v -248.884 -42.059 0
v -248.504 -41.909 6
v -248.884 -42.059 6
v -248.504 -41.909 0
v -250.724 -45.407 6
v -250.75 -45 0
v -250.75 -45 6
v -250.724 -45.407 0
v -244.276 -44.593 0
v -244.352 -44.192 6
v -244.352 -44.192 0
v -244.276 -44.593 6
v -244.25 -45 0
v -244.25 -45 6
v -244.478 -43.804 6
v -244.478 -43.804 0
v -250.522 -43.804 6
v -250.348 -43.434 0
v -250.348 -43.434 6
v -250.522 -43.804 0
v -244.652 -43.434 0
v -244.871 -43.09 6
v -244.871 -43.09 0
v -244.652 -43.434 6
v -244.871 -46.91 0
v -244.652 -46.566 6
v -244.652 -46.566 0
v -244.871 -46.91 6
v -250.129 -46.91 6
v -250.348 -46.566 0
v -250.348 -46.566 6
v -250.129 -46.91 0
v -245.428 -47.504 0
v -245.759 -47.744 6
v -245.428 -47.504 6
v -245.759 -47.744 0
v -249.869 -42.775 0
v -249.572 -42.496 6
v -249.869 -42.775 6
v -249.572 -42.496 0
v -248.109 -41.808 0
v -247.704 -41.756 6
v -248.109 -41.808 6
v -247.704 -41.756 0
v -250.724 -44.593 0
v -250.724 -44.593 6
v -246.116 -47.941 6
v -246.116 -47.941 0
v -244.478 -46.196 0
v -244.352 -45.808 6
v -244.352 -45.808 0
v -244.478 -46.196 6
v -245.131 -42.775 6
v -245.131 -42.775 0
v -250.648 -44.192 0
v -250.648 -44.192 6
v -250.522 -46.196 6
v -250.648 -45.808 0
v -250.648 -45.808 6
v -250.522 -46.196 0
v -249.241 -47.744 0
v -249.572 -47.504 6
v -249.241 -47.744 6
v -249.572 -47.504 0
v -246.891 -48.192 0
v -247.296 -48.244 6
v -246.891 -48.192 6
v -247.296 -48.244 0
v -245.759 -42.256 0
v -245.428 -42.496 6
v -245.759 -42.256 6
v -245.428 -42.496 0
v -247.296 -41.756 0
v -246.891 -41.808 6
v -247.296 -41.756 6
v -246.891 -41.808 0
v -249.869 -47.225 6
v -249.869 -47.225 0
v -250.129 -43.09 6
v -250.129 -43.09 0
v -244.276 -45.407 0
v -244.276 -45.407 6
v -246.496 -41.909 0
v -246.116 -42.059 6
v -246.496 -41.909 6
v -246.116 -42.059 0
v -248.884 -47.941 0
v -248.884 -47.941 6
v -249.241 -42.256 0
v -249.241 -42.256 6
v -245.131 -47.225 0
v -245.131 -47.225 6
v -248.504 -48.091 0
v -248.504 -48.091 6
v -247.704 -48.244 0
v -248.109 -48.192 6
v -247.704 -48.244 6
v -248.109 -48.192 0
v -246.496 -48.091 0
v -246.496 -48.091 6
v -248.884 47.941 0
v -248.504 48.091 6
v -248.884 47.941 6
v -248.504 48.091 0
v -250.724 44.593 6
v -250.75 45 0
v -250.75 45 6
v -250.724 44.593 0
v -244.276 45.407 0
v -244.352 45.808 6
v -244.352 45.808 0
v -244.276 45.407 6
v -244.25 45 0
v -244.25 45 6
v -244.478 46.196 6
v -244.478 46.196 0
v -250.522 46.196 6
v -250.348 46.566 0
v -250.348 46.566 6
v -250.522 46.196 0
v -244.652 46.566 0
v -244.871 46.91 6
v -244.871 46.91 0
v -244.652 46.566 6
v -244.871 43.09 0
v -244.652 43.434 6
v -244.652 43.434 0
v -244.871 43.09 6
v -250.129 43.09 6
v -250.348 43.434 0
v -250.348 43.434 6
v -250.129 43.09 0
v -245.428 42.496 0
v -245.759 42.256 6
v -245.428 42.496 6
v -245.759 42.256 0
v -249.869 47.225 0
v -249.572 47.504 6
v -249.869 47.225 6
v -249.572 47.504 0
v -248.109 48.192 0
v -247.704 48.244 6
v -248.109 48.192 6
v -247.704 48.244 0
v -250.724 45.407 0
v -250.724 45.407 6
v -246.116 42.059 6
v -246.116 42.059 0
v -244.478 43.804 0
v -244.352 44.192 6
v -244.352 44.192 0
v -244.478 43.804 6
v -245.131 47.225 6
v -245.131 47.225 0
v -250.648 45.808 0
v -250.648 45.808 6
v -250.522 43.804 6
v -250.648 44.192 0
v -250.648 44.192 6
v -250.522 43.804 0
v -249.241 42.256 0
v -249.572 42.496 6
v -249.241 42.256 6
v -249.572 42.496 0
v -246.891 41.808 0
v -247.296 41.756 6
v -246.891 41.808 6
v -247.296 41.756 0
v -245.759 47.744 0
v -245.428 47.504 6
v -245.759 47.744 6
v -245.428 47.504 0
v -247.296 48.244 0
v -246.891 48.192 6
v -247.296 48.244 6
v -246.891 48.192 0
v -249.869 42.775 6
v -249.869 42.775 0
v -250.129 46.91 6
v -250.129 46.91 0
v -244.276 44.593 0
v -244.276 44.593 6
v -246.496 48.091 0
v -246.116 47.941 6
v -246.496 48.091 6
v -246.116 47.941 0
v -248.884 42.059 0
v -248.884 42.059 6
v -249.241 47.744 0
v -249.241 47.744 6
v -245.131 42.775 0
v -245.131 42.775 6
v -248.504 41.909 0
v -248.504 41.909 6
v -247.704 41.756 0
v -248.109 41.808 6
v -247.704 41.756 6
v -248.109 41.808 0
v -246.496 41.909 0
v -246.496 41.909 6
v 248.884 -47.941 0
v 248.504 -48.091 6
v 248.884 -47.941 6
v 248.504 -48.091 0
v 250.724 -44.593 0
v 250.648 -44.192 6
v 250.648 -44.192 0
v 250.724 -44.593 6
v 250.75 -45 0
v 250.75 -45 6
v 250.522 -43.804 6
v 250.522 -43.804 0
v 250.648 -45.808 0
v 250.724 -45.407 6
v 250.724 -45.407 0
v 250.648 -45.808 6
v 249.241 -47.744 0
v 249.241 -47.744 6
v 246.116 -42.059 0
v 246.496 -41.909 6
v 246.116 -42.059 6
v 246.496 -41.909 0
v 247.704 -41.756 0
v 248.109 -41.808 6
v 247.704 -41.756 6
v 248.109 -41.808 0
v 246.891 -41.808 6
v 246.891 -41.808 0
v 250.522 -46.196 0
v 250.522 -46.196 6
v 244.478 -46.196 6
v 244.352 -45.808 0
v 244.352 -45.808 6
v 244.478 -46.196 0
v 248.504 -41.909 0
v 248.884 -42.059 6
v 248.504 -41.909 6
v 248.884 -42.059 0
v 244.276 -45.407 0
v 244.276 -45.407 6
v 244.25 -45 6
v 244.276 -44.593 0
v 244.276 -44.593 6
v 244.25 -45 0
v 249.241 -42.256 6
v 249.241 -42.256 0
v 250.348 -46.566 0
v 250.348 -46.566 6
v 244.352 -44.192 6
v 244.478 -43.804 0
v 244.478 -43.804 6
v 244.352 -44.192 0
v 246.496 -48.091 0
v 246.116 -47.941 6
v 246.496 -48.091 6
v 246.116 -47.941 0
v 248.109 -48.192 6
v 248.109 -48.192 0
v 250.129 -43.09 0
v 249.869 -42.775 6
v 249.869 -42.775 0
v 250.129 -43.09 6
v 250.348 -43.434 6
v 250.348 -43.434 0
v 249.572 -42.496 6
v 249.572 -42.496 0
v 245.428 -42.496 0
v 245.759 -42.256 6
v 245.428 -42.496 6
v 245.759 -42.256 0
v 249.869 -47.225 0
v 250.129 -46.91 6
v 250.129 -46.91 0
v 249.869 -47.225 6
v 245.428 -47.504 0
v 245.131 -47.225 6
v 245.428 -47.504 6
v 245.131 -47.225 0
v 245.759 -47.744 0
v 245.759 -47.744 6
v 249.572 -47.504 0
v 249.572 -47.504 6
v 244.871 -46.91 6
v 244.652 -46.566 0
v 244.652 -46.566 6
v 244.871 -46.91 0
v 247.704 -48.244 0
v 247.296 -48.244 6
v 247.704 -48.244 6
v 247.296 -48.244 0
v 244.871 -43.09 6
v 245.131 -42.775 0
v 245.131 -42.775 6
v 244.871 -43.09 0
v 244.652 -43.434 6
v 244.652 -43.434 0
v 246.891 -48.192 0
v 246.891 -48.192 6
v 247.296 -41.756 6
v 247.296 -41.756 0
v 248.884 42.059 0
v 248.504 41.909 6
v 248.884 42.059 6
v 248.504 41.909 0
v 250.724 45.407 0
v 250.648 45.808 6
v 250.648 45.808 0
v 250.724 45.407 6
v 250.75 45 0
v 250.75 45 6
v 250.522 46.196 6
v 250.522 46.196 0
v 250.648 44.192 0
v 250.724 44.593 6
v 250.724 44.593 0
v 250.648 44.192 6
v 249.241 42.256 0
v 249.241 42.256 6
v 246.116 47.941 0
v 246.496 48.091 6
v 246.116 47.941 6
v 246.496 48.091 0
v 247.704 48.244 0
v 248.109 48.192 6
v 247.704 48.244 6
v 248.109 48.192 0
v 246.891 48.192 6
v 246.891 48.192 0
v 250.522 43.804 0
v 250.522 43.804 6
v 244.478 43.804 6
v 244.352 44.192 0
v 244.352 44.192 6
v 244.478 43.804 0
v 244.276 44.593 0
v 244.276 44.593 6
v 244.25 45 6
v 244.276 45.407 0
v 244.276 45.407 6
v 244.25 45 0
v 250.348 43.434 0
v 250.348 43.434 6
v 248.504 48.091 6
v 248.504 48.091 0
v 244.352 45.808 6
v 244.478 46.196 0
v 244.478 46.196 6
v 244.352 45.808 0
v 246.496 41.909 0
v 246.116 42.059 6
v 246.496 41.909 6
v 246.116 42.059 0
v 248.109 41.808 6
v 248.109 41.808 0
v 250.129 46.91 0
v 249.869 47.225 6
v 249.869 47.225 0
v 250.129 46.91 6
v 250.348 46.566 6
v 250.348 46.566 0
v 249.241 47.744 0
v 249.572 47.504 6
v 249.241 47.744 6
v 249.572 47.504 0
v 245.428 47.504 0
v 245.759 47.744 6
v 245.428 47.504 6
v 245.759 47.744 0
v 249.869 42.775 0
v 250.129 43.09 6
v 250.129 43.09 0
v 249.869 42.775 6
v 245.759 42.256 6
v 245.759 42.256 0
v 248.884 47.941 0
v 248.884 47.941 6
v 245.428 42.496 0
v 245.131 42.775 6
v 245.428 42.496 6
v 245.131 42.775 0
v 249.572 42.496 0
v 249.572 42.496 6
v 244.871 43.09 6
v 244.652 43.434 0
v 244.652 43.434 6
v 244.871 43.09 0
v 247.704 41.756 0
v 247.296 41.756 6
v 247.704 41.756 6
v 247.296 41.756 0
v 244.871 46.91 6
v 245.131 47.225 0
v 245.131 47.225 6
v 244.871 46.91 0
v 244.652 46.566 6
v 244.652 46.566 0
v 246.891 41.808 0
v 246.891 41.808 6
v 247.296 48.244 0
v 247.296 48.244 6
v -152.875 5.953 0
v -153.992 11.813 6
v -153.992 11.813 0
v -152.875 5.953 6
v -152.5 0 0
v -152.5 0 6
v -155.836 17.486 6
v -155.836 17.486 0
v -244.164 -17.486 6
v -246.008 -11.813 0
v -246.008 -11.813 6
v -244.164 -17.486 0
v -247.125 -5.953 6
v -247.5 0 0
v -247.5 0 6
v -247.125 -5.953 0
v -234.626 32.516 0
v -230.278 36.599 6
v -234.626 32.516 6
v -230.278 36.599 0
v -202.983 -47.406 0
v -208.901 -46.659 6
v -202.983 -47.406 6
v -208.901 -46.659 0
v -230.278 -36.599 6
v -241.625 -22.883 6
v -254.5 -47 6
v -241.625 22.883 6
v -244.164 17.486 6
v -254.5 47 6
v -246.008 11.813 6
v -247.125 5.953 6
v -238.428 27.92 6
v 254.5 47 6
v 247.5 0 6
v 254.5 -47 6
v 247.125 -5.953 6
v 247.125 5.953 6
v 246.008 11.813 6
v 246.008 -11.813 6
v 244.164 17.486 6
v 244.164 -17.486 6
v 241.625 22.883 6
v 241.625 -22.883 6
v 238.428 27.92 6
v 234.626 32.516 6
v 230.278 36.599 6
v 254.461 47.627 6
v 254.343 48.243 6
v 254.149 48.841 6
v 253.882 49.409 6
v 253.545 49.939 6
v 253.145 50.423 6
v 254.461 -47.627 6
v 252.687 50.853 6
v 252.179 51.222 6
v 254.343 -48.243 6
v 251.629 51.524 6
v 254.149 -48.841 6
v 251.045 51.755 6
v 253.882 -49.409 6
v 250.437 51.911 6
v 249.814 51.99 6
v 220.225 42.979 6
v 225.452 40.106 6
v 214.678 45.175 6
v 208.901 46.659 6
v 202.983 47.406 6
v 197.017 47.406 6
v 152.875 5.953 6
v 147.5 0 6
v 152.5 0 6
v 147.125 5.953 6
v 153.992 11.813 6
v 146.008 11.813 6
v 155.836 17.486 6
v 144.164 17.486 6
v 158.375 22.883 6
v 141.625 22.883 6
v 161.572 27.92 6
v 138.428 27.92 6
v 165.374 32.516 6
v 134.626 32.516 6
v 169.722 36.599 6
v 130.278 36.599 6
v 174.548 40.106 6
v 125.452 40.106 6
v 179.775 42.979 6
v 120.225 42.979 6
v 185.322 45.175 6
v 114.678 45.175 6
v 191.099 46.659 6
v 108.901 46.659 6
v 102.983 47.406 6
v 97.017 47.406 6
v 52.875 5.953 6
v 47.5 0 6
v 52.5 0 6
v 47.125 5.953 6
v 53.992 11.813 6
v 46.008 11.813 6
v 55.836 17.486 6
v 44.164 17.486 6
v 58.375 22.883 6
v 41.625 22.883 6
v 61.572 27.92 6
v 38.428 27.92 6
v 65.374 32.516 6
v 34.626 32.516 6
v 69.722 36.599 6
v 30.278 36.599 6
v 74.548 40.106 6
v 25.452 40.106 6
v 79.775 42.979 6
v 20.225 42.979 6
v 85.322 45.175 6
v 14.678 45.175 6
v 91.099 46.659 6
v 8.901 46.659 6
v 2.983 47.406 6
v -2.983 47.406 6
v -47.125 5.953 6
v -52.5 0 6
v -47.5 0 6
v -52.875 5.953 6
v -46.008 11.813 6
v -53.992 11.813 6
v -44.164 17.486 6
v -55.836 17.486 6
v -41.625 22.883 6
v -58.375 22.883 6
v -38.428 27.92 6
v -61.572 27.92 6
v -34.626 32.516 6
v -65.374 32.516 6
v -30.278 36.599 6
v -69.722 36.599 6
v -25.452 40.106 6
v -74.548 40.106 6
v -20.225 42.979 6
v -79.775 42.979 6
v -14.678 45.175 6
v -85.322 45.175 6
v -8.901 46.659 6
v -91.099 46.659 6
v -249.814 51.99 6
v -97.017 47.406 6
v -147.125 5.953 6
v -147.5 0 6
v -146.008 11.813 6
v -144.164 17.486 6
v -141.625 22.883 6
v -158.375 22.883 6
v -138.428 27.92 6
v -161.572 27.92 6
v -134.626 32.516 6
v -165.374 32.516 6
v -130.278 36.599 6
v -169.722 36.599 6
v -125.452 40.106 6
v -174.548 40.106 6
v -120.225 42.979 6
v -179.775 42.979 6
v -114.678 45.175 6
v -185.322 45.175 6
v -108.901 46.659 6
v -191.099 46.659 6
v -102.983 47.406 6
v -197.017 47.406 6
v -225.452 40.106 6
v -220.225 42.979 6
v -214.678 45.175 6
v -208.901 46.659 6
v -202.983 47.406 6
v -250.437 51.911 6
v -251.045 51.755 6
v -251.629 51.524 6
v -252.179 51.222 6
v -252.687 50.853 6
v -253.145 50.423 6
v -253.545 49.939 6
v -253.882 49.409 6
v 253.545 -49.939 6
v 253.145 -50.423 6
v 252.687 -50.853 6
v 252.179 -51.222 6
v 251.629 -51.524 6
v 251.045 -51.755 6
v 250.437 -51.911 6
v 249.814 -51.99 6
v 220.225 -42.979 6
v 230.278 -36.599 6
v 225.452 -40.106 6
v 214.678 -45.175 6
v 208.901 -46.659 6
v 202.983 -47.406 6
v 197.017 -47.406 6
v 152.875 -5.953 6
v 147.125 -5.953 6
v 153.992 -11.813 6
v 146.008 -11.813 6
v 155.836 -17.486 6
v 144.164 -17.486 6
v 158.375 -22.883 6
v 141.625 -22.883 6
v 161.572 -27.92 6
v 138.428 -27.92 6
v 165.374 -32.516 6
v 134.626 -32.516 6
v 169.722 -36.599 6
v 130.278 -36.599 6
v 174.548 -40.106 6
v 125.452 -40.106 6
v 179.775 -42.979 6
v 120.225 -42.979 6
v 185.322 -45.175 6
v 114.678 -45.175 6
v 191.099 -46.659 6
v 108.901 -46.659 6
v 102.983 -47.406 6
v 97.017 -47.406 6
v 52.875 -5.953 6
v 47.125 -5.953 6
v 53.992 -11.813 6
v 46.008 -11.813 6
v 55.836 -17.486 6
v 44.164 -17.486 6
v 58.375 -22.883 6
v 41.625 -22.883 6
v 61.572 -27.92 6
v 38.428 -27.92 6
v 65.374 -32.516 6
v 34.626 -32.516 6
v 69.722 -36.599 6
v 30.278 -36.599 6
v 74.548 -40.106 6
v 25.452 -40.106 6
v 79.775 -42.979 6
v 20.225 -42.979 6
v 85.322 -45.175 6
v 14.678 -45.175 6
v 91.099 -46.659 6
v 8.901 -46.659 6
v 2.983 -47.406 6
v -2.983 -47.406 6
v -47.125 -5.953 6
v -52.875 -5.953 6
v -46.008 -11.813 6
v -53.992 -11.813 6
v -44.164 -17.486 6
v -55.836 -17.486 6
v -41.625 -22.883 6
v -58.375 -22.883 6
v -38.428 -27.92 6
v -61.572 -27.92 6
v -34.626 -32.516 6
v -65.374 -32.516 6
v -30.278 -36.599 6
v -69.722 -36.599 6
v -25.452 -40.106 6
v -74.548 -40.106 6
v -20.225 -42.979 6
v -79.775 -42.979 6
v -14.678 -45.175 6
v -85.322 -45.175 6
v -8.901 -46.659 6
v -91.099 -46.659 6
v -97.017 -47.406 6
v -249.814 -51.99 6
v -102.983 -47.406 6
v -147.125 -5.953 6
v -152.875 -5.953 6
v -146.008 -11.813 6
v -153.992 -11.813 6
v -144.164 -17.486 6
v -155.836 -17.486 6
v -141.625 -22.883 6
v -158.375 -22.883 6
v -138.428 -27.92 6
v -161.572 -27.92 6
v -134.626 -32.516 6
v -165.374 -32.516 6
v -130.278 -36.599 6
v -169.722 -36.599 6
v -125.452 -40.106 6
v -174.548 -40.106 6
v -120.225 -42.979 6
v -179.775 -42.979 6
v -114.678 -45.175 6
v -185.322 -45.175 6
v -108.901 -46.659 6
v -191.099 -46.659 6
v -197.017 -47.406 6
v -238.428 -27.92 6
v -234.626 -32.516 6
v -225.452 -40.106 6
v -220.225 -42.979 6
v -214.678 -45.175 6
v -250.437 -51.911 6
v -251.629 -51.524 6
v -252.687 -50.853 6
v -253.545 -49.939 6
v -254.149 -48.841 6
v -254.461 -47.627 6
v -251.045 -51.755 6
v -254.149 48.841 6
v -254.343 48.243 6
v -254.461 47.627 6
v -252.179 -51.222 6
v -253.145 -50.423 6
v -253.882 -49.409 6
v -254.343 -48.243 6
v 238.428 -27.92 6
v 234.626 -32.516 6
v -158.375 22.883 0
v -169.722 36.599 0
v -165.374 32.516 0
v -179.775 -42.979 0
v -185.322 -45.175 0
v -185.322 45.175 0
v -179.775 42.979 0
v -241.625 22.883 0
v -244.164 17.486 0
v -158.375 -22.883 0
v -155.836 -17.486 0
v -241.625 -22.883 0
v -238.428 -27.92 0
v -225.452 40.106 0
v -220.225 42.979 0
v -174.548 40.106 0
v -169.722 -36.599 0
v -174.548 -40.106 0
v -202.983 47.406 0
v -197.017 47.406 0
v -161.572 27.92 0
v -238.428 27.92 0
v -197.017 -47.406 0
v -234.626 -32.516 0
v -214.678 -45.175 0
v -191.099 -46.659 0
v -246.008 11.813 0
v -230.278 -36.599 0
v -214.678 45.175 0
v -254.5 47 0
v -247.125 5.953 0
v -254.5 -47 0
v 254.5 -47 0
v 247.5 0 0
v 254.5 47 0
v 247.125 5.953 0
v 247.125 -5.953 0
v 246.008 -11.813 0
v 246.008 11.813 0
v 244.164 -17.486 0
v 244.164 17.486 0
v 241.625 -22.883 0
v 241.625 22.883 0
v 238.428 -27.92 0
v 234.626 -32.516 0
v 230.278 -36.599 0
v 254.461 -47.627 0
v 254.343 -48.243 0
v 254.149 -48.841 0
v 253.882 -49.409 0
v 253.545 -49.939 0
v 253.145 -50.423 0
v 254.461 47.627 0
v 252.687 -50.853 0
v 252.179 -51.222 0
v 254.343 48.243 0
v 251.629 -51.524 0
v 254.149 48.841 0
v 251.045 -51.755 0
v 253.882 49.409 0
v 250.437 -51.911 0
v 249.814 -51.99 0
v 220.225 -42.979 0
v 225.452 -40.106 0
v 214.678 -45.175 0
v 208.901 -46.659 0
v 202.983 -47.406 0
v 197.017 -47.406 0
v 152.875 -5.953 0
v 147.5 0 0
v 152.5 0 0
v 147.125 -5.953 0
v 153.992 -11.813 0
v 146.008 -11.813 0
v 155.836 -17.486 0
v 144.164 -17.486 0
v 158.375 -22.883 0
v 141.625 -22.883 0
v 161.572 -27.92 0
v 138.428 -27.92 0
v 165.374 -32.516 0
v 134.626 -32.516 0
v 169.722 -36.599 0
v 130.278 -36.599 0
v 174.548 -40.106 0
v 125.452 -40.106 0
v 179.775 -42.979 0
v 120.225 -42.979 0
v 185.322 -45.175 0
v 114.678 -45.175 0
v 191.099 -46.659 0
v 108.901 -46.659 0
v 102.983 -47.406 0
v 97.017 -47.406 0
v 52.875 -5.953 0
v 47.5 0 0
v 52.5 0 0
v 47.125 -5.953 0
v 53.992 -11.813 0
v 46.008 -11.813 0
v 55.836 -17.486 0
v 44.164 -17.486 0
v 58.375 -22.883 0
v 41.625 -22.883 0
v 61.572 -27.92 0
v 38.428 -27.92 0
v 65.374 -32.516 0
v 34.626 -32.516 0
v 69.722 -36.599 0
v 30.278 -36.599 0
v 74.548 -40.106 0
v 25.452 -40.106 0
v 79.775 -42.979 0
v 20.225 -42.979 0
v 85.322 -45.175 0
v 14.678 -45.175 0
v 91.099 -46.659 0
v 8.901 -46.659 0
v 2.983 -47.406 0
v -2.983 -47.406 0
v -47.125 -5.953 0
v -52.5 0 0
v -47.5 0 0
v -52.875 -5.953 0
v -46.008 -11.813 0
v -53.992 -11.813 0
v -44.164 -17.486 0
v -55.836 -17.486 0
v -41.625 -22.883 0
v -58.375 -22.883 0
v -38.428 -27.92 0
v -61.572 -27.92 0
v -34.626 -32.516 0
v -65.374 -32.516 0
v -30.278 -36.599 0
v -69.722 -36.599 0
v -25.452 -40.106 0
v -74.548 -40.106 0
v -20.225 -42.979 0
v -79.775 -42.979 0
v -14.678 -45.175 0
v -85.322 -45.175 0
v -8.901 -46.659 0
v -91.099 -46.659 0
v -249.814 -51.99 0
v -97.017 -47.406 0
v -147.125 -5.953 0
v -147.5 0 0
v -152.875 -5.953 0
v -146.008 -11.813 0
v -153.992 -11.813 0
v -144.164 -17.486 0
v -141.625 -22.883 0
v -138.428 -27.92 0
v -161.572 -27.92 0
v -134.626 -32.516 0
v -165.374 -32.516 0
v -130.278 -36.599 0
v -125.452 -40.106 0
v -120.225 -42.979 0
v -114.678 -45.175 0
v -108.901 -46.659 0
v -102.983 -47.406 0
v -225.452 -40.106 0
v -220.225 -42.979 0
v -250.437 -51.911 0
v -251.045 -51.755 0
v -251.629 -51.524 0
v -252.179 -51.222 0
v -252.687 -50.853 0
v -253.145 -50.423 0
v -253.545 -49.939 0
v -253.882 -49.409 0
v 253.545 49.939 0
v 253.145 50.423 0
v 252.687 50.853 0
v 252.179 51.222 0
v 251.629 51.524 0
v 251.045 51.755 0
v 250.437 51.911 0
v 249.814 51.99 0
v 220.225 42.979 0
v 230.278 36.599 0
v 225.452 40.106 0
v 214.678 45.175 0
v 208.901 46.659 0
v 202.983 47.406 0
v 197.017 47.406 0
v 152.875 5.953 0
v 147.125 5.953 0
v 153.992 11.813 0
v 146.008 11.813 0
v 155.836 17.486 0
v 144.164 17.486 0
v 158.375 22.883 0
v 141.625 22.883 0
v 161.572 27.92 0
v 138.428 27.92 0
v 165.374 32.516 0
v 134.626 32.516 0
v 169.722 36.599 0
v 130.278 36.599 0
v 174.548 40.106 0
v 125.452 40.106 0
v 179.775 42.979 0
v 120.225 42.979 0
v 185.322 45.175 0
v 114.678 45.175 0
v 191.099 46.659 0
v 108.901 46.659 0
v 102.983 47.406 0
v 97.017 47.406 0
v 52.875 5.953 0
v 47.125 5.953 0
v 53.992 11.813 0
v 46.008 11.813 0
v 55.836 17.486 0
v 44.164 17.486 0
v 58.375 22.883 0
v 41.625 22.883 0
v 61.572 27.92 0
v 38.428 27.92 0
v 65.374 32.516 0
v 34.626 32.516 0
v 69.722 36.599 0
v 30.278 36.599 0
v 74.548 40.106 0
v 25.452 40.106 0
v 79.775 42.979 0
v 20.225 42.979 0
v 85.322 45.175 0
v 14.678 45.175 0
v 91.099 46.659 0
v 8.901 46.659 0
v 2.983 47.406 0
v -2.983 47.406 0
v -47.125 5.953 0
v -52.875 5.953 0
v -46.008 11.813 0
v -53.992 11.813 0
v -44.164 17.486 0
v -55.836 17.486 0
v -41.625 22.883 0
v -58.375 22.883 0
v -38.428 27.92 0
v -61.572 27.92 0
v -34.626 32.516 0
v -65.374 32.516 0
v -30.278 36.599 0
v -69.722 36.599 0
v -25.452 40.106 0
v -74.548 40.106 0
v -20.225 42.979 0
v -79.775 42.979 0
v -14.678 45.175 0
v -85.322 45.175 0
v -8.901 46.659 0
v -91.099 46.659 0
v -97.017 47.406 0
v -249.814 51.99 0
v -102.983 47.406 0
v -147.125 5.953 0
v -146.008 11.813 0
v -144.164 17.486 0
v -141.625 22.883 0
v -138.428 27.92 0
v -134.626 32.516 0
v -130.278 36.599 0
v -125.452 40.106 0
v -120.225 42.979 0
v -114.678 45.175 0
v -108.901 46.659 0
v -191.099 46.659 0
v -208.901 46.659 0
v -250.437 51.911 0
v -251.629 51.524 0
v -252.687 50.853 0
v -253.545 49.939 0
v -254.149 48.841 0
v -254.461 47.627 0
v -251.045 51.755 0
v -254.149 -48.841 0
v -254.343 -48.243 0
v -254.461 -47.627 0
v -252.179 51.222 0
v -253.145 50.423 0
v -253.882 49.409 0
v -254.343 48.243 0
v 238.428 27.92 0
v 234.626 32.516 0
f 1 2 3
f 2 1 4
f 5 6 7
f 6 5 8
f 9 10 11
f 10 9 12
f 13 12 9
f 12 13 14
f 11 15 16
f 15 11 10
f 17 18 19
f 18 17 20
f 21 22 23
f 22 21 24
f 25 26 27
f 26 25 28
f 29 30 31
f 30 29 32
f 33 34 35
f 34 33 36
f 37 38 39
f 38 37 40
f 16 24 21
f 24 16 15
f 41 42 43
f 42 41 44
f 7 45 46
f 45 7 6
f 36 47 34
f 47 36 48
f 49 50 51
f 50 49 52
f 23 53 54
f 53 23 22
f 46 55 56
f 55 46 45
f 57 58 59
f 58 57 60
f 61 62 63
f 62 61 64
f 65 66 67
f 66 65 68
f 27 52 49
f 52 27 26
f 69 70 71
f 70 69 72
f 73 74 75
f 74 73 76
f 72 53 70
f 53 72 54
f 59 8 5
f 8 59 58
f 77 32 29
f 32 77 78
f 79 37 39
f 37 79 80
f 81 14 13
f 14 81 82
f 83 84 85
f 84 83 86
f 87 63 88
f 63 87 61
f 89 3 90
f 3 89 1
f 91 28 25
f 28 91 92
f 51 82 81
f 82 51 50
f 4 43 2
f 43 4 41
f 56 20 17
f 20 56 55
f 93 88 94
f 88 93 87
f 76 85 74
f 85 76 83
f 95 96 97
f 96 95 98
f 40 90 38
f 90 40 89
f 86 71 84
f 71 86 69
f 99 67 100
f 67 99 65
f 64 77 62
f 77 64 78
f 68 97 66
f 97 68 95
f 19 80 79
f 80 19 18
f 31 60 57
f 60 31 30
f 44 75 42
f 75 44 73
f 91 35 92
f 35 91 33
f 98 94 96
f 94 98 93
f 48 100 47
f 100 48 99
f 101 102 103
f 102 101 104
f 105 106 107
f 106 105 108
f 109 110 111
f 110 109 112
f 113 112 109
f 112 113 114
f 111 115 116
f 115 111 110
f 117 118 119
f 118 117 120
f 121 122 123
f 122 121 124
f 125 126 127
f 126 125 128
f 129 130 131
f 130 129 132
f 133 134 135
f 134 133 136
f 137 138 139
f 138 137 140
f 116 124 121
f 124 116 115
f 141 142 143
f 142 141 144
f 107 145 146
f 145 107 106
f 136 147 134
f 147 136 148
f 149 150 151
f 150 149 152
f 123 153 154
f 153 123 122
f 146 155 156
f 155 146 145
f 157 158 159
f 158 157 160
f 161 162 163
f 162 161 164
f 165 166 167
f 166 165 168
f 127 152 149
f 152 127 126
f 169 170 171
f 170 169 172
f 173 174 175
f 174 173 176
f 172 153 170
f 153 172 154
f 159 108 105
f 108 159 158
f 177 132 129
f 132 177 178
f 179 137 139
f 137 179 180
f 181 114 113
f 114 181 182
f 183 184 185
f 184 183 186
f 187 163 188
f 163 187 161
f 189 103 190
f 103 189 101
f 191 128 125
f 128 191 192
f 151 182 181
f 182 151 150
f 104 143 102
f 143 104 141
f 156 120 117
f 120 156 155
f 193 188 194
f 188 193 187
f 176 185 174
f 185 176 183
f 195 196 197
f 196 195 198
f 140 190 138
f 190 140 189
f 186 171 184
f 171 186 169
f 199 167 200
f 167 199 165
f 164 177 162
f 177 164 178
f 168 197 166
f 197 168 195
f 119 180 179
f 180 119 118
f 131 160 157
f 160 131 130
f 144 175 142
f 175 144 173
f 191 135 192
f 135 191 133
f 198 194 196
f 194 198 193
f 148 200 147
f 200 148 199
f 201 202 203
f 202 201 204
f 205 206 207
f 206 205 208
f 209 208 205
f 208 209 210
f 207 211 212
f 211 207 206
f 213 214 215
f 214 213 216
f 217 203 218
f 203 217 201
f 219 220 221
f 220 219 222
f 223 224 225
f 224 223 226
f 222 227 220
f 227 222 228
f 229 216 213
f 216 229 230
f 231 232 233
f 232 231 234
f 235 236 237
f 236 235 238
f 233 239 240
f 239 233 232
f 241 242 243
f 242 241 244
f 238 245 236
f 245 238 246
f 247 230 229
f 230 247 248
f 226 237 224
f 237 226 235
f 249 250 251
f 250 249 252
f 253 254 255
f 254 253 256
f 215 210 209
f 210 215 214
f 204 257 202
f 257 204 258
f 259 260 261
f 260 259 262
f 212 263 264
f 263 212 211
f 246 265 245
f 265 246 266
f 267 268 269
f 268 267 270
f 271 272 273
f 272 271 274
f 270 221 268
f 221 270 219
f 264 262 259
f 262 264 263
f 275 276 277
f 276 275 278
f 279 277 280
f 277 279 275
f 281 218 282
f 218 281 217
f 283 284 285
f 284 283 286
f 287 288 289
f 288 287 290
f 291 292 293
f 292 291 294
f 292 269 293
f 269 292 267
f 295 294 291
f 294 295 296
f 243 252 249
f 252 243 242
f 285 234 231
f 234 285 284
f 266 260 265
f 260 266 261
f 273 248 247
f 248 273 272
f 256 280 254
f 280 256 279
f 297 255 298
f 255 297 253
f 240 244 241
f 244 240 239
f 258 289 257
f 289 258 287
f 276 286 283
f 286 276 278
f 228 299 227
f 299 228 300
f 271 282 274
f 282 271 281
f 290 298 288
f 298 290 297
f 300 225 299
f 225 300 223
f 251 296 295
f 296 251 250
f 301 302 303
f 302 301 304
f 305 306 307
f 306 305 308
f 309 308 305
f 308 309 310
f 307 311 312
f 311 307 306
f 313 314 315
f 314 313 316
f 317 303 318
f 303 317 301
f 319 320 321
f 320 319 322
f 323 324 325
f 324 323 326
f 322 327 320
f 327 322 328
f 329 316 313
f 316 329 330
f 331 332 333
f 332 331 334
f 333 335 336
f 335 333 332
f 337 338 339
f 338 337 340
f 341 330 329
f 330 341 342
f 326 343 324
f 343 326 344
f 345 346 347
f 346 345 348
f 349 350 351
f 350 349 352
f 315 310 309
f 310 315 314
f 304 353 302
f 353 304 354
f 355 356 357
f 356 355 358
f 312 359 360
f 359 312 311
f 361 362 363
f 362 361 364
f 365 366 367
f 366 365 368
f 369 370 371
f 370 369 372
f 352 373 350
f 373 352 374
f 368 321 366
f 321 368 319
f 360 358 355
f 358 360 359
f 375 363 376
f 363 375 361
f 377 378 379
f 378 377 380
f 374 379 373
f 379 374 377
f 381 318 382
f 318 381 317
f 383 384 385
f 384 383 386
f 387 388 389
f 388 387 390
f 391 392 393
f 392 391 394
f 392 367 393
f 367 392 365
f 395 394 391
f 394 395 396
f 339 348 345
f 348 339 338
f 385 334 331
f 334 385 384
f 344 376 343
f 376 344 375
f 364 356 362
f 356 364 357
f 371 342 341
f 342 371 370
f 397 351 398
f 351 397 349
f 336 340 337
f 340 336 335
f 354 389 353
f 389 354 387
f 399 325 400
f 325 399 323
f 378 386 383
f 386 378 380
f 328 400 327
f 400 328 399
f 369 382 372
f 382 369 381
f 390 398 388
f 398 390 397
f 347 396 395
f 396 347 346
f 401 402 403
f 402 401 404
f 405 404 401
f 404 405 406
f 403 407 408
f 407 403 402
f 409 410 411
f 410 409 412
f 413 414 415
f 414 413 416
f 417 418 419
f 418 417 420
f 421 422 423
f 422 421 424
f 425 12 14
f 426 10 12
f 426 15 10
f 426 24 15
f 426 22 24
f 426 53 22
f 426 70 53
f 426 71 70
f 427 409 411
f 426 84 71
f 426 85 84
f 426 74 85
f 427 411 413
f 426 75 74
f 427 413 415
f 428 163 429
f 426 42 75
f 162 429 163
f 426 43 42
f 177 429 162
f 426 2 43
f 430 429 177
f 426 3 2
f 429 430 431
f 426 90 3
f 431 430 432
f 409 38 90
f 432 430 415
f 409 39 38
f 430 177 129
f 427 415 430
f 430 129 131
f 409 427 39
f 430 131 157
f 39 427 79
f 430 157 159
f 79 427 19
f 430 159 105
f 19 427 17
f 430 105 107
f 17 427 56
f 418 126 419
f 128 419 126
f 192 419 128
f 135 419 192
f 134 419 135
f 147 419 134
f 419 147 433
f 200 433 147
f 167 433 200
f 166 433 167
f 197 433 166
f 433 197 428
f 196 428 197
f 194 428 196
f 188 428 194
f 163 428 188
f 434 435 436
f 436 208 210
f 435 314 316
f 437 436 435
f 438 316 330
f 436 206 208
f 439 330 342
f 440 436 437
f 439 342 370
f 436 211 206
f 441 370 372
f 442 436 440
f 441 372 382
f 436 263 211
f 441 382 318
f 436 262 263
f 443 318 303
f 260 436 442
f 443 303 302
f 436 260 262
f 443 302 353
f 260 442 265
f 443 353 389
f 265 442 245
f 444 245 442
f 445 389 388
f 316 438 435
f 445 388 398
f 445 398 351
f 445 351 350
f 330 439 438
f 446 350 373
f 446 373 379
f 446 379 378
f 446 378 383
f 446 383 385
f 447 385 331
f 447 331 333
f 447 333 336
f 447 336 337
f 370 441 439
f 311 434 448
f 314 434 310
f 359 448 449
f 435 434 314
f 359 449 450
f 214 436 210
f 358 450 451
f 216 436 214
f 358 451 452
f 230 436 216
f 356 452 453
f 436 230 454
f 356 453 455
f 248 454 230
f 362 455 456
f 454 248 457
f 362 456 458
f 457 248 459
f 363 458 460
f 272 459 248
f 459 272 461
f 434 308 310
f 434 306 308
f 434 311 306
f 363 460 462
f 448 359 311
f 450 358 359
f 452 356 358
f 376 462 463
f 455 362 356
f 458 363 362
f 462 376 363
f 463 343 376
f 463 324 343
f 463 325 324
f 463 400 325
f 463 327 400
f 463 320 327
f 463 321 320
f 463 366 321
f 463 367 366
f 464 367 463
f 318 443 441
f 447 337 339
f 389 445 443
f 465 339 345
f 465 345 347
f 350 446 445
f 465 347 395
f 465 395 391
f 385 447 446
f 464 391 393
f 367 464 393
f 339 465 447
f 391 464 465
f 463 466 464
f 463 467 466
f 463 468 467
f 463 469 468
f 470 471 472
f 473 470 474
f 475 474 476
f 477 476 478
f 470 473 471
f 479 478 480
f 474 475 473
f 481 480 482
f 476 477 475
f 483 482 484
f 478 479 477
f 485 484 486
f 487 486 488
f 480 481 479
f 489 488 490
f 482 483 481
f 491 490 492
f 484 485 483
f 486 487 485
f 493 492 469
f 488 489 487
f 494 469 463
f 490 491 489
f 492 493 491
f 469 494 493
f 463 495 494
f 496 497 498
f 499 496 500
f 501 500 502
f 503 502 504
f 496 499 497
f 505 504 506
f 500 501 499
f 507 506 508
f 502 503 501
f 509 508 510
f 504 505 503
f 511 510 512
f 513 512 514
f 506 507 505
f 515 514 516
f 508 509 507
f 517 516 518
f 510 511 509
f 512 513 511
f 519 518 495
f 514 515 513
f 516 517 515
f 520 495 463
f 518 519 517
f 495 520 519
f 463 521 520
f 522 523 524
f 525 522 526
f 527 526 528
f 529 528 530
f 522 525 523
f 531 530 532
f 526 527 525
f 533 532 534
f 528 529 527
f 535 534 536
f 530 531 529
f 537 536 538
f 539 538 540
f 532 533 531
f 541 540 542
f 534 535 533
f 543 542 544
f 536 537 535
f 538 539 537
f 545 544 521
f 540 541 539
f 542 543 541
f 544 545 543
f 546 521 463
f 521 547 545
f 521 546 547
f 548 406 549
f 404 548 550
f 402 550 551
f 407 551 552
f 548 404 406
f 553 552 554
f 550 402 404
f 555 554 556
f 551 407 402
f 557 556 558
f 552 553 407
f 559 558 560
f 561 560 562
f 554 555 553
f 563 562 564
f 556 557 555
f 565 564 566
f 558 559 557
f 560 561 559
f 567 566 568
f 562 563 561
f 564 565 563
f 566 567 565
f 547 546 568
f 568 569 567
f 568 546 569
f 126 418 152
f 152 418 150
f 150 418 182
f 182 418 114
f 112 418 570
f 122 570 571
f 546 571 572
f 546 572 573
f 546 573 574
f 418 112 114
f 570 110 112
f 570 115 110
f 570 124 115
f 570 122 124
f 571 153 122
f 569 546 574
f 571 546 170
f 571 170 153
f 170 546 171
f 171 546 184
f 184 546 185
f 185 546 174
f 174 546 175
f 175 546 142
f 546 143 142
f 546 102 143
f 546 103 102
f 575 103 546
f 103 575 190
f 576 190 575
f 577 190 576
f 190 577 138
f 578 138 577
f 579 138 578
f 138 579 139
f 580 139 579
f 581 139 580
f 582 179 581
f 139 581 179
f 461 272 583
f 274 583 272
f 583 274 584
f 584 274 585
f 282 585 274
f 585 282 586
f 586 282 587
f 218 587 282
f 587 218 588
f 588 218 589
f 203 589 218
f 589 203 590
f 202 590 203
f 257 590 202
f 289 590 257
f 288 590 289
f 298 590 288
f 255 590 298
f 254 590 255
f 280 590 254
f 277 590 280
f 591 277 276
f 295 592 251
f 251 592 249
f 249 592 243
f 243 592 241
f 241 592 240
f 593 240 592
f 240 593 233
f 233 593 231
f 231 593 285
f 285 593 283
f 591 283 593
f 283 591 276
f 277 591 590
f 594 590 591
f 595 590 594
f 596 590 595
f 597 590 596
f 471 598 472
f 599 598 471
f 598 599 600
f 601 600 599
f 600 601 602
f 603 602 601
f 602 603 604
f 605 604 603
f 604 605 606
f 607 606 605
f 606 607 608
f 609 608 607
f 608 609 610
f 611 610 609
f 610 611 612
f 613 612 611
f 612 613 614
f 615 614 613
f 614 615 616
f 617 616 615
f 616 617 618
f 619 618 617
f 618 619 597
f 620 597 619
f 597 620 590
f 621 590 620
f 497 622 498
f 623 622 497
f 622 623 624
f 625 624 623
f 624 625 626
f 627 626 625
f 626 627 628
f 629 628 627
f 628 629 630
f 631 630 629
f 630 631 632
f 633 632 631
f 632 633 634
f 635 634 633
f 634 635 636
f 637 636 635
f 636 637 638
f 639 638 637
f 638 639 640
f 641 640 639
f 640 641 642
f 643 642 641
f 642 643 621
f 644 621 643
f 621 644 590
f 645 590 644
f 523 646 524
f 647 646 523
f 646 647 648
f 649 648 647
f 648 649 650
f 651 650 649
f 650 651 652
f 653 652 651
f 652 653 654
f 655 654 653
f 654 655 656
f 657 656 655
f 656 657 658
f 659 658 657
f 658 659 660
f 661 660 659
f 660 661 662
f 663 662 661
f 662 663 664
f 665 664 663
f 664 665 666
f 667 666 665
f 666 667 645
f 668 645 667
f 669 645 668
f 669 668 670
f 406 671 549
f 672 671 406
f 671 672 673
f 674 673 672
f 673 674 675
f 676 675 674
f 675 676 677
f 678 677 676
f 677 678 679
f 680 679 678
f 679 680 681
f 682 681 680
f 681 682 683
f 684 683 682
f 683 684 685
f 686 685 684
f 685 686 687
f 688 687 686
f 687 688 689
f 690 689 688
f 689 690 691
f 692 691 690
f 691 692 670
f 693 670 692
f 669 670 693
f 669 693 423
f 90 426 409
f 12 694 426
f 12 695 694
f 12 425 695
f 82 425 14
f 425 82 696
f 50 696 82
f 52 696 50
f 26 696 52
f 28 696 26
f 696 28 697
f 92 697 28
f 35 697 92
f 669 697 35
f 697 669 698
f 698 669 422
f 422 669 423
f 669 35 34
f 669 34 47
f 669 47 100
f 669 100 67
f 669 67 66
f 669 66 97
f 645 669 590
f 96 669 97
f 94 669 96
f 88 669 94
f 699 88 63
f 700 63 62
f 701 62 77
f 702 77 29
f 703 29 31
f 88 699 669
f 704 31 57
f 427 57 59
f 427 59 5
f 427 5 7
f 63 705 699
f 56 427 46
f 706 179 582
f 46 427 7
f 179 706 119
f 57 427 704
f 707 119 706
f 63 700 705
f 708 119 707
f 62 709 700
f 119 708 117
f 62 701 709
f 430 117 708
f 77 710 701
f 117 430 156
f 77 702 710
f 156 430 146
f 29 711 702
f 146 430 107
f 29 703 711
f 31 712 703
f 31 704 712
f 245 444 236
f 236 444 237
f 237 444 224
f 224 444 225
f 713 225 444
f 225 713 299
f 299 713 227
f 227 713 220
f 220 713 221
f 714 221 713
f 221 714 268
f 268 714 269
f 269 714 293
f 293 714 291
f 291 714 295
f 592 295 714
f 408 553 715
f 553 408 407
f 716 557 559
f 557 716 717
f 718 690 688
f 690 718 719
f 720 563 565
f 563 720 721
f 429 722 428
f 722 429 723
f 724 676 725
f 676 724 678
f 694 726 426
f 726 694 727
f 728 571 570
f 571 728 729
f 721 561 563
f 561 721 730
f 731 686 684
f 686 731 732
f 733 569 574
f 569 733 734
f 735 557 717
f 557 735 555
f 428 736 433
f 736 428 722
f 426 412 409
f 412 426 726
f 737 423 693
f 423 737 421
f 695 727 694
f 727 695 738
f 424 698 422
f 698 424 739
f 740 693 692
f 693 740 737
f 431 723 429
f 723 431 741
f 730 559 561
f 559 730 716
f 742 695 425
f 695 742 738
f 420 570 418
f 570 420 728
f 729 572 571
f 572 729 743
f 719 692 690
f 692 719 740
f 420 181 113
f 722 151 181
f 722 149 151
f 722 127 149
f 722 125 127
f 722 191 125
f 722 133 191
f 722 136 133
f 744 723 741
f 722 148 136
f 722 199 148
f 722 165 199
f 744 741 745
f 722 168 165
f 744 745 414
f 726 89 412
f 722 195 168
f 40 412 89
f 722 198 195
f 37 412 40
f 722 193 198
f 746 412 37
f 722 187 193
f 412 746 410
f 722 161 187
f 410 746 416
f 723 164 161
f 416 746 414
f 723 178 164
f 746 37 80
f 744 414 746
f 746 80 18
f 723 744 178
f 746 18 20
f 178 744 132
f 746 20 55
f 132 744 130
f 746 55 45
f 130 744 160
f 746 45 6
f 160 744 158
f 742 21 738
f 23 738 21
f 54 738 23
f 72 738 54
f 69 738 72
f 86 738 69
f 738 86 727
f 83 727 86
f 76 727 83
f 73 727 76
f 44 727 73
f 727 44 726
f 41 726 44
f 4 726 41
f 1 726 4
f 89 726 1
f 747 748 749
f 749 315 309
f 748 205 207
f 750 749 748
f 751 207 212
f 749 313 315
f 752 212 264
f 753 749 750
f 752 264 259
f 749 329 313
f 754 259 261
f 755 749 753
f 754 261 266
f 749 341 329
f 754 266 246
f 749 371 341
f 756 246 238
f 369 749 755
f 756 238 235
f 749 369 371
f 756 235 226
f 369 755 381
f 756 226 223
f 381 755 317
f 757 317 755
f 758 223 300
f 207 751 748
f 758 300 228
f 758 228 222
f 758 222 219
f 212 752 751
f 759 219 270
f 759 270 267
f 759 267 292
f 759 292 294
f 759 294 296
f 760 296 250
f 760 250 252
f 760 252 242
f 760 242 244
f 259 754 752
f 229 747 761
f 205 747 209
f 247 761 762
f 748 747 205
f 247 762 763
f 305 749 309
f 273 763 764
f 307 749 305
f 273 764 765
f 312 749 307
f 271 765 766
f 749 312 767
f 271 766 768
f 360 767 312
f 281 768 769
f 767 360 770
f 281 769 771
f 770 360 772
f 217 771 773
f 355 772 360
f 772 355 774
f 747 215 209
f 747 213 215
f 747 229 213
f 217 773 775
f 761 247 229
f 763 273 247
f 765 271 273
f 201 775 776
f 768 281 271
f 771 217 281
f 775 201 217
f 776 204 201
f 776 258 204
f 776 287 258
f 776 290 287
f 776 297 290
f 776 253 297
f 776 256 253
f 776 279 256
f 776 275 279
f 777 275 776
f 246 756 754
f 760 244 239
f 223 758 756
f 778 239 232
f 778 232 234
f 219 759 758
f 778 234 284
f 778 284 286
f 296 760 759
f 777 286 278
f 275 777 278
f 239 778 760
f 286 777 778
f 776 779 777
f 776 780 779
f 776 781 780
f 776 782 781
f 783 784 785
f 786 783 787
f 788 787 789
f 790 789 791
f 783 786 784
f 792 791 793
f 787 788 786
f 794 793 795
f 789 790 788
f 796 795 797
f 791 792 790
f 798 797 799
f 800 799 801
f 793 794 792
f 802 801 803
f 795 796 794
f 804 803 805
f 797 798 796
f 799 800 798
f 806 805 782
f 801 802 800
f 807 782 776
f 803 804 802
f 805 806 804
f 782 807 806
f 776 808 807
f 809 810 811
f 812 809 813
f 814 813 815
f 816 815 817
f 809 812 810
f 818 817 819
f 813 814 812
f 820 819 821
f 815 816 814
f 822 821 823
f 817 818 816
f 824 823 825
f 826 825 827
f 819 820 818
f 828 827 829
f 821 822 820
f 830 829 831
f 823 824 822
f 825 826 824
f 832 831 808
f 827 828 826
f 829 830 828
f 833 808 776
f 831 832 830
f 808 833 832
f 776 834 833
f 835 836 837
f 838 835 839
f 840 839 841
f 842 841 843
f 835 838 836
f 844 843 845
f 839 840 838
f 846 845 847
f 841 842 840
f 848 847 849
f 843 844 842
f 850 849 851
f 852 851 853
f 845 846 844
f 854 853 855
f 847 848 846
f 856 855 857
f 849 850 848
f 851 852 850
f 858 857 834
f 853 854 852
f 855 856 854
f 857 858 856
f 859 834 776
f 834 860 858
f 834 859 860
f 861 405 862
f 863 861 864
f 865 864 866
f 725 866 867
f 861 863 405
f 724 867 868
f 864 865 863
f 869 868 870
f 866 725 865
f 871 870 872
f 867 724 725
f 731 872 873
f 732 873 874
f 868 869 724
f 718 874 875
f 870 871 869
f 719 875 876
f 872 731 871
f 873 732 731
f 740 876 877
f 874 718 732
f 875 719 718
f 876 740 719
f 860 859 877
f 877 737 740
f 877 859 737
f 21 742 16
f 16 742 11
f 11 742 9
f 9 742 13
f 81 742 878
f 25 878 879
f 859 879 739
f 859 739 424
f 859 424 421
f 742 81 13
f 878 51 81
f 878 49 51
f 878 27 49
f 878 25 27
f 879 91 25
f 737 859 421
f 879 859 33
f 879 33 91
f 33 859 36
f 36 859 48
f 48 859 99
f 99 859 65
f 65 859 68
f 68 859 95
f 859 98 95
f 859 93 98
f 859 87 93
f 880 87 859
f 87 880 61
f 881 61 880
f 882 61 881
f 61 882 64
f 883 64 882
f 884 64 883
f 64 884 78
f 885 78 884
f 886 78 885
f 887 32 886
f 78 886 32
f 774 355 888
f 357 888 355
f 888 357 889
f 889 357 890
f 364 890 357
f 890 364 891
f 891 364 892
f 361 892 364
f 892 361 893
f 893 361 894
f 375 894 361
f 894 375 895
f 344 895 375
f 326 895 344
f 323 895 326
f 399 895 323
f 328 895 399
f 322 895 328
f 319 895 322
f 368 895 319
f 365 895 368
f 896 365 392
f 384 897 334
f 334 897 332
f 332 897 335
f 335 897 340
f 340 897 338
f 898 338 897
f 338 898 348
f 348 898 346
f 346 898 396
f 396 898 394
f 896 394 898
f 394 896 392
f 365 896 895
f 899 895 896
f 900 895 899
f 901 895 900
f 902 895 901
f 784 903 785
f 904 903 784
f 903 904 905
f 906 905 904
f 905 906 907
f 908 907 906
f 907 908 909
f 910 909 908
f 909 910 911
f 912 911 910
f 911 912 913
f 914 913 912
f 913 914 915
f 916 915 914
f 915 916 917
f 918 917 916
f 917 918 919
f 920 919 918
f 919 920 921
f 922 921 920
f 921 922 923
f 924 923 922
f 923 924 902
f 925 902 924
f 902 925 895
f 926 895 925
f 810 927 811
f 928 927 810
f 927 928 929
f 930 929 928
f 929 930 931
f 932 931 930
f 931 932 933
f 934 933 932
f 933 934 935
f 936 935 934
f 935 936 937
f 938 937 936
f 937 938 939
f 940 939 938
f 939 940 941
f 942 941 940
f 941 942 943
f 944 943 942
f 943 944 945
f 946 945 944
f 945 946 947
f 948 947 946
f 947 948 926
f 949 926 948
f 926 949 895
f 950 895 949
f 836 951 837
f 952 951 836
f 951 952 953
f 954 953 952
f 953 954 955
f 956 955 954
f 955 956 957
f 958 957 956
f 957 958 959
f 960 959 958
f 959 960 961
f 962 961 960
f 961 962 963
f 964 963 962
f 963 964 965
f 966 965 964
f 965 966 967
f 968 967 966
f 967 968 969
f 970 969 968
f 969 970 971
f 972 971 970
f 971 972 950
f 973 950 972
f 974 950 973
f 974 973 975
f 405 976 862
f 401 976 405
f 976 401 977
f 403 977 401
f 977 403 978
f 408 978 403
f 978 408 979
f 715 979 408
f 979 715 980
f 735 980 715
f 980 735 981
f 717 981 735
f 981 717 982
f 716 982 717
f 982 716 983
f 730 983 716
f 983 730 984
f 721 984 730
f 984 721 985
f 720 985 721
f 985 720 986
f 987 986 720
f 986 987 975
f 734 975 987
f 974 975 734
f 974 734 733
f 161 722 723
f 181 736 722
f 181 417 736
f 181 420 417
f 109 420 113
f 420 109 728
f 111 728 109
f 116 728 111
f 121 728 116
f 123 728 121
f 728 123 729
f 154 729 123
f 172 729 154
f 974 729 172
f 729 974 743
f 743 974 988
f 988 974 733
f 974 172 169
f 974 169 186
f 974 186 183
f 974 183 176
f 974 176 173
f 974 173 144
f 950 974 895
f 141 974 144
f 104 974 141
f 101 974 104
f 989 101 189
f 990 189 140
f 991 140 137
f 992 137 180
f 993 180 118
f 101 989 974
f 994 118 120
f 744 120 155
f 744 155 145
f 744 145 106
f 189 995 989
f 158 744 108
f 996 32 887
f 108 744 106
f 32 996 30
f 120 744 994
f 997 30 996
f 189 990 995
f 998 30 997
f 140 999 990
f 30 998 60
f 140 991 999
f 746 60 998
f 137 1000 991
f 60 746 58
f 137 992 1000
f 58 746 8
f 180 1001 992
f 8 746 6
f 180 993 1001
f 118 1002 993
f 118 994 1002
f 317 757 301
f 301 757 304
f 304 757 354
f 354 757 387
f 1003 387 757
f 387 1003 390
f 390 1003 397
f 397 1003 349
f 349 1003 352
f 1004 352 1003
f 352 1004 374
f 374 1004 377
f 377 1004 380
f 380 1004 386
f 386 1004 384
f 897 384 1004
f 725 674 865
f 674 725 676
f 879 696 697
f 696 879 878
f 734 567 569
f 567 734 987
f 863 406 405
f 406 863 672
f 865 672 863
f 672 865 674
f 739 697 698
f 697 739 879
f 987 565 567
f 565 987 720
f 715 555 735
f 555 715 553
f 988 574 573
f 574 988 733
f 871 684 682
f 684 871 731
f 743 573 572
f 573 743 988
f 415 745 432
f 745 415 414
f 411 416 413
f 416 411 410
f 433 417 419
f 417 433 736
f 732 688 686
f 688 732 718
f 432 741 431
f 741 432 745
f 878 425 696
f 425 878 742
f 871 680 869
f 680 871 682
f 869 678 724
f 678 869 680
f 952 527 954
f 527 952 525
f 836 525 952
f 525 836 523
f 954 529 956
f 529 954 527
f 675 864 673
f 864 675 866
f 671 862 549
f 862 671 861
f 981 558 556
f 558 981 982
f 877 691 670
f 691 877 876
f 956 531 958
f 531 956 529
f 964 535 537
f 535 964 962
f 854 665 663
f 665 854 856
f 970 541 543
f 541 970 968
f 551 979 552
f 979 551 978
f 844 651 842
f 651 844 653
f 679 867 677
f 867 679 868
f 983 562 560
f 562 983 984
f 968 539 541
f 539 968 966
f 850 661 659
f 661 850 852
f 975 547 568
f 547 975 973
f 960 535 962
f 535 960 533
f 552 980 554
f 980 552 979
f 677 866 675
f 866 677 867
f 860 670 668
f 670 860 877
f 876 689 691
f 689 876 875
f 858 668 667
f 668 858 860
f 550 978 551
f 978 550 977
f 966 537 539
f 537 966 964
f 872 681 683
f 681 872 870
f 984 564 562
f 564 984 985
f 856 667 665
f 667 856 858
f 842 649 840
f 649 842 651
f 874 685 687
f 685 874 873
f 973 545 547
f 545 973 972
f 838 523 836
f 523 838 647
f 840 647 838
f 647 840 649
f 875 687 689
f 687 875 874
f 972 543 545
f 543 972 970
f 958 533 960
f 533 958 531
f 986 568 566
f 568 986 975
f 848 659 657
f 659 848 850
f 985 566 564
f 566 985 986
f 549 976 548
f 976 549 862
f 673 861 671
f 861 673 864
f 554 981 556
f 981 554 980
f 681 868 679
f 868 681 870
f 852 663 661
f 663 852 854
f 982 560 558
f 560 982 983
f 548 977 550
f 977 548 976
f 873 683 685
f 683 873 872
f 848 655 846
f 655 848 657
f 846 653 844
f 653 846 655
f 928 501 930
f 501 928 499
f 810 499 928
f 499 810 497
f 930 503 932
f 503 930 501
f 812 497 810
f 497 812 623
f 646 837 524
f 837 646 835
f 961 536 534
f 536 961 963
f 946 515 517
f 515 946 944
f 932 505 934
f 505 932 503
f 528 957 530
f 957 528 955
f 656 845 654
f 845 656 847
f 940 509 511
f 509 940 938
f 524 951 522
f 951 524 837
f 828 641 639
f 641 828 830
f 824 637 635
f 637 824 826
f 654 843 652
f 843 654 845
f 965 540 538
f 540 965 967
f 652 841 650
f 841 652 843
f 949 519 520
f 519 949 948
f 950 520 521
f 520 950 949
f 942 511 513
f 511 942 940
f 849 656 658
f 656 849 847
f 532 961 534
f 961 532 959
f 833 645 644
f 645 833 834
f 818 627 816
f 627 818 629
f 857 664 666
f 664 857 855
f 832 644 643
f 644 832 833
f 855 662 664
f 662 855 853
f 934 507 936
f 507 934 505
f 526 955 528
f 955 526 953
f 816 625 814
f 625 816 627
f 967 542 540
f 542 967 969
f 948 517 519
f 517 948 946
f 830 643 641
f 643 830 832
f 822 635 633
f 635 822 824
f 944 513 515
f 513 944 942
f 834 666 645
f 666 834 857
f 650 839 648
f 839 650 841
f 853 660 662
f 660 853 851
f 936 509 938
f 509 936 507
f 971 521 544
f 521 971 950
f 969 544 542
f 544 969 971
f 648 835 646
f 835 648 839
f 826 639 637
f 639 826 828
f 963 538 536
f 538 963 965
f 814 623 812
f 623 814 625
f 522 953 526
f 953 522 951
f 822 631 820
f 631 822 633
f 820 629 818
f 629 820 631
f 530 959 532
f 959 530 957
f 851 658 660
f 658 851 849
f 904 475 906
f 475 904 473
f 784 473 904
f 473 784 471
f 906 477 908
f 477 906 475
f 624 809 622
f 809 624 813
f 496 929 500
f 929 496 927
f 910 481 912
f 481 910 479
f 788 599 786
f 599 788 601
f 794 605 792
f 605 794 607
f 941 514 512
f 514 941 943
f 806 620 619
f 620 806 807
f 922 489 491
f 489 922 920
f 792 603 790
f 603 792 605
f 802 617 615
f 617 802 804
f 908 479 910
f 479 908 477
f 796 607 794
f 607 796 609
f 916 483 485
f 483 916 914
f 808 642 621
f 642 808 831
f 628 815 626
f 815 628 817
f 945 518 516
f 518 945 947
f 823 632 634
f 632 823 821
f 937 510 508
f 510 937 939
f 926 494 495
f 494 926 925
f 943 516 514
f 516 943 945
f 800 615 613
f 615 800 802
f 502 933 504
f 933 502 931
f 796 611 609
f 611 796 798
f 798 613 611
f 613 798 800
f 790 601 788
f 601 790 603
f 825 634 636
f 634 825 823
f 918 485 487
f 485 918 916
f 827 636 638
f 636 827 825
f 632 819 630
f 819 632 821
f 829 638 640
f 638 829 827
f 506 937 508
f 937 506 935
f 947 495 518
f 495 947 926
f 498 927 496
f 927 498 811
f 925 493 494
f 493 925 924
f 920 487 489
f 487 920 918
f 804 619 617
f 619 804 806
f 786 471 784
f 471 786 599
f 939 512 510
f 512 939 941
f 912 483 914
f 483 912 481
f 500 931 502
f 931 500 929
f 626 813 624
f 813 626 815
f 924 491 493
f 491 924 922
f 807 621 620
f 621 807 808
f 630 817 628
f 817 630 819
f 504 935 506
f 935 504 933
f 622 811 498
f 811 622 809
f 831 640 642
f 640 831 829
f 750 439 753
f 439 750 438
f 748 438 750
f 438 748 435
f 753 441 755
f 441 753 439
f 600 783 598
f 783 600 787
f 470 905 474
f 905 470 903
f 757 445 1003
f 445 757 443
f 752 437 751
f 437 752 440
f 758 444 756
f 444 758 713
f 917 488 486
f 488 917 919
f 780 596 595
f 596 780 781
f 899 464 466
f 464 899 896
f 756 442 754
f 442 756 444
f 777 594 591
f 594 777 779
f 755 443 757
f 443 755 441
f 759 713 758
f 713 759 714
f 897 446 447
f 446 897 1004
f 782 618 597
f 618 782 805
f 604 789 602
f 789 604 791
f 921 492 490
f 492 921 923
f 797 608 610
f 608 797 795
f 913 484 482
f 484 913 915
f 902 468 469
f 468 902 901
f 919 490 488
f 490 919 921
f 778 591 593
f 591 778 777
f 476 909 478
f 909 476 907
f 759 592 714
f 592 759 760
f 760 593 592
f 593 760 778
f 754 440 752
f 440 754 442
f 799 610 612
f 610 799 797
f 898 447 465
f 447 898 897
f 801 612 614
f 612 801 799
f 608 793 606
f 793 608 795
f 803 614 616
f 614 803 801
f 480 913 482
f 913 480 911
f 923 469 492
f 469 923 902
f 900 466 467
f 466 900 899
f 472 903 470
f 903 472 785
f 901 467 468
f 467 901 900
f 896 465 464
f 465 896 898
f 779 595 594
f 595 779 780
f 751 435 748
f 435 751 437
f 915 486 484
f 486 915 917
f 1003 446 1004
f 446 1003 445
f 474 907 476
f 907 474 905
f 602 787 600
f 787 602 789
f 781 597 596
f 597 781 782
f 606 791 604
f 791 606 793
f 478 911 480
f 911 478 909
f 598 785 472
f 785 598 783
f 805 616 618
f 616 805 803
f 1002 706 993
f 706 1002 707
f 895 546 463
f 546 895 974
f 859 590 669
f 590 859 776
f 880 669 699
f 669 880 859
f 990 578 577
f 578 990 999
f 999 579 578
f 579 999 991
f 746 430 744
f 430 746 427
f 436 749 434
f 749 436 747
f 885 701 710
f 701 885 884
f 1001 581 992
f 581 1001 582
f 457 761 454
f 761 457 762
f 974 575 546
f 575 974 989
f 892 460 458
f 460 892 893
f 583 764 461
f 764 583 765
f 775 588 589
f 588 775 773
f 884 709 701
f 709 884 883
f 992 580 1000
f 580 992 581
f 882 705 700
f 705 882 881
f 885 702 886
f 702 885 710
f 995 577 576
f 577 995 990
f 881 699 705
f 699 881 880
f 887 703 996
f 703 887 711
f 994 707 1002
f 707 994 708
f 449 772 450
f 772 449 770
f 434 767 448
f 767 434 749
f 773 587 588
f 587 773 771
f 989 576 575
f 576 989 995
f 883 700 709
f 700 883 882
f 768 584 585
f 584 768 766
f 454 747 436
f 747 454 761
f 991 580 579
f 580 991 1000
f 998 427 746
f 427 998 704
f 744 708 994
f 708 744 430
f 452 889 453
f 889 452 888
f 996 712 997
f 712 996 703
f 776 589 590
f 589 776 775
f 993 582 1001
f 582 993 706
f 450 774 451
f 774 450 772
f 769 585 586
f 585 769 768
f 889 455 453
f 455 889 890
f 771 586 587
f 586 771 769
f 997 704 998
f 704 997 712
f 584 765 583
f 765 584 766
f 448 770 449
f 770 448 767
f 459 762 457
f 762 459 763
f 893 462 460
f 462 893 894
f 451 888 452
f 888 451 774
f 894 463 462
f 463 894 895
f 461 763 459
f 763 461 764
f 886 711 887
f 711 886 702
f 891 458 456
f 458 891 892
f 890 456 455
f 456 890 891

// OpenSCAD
$fn = 50;

difference() {
	union() {
		hull() {
			translate(v = [-249.5, 47.0, 0]) {
				cylinder(h = 6, r = 5);
			}
			translate(v = [249.5, 47.0, 0]) {
				cylinder(h = 6, r = 5);
			}
			translate(v = [-249.5, -47.0, 0]) {
				cylinder(h = 6, r = 5);
			}
			translate(v = [249.5, -47.0, 0]) {
				cylinder(h = 6, r = 5);
			}
		}
	}
	union() {
		translate(v = [-247.5, -45.0, -100.0]) {
			cylinder(h = 200, r = 3.25);
		}
		translate(v = [-247.5, 45.0, -100.0]) {
			cylinder(h = 200, r = 3.25);
		}
		translate(v = [247.5, -45.0, -100.0]) {
			cylinder(h = 200, r = 3.25);
		}
		translate(v = [247.5, 45.0, -100.0]) {
			cylinder(h = 200, r = 3.25);
		}
		translate(v = [-247.5, -45.0, -100.0]) {
			cylinder(h = 200, r = 1.8);
		}
		translate(v = [-247.5, 45.0, -100.0]) {
			cylinder(h = 200, r = 1.8);
		}
		translate(v = [247.5, -45.0, -100.0]) {
			cylinder(h = 200, r = 1.8);
		}
		translate(v = [247.5, 45.0, -100.0]) {
			cylinder(h = 200, r = 1.8);
		}
		translate(v = [-200.0, 0, 0.0]) {
			cylinder(h = 6, r = 47.5);
		}
		translate(v = [-100.0, 0, 0.0]) {
			cylinder(h = 6, r = 47.5);
		}
		cylinder(h = 6, r = 47.5);
		translate(v = [100.0, 0, 0.0]) {
			cylinder(h = 6, r = 47.5);
		}
		translate(v = [200.0, 0, 0.0]) {
			cylinder(h = 6, r = 47.5);
		}
	}
}
